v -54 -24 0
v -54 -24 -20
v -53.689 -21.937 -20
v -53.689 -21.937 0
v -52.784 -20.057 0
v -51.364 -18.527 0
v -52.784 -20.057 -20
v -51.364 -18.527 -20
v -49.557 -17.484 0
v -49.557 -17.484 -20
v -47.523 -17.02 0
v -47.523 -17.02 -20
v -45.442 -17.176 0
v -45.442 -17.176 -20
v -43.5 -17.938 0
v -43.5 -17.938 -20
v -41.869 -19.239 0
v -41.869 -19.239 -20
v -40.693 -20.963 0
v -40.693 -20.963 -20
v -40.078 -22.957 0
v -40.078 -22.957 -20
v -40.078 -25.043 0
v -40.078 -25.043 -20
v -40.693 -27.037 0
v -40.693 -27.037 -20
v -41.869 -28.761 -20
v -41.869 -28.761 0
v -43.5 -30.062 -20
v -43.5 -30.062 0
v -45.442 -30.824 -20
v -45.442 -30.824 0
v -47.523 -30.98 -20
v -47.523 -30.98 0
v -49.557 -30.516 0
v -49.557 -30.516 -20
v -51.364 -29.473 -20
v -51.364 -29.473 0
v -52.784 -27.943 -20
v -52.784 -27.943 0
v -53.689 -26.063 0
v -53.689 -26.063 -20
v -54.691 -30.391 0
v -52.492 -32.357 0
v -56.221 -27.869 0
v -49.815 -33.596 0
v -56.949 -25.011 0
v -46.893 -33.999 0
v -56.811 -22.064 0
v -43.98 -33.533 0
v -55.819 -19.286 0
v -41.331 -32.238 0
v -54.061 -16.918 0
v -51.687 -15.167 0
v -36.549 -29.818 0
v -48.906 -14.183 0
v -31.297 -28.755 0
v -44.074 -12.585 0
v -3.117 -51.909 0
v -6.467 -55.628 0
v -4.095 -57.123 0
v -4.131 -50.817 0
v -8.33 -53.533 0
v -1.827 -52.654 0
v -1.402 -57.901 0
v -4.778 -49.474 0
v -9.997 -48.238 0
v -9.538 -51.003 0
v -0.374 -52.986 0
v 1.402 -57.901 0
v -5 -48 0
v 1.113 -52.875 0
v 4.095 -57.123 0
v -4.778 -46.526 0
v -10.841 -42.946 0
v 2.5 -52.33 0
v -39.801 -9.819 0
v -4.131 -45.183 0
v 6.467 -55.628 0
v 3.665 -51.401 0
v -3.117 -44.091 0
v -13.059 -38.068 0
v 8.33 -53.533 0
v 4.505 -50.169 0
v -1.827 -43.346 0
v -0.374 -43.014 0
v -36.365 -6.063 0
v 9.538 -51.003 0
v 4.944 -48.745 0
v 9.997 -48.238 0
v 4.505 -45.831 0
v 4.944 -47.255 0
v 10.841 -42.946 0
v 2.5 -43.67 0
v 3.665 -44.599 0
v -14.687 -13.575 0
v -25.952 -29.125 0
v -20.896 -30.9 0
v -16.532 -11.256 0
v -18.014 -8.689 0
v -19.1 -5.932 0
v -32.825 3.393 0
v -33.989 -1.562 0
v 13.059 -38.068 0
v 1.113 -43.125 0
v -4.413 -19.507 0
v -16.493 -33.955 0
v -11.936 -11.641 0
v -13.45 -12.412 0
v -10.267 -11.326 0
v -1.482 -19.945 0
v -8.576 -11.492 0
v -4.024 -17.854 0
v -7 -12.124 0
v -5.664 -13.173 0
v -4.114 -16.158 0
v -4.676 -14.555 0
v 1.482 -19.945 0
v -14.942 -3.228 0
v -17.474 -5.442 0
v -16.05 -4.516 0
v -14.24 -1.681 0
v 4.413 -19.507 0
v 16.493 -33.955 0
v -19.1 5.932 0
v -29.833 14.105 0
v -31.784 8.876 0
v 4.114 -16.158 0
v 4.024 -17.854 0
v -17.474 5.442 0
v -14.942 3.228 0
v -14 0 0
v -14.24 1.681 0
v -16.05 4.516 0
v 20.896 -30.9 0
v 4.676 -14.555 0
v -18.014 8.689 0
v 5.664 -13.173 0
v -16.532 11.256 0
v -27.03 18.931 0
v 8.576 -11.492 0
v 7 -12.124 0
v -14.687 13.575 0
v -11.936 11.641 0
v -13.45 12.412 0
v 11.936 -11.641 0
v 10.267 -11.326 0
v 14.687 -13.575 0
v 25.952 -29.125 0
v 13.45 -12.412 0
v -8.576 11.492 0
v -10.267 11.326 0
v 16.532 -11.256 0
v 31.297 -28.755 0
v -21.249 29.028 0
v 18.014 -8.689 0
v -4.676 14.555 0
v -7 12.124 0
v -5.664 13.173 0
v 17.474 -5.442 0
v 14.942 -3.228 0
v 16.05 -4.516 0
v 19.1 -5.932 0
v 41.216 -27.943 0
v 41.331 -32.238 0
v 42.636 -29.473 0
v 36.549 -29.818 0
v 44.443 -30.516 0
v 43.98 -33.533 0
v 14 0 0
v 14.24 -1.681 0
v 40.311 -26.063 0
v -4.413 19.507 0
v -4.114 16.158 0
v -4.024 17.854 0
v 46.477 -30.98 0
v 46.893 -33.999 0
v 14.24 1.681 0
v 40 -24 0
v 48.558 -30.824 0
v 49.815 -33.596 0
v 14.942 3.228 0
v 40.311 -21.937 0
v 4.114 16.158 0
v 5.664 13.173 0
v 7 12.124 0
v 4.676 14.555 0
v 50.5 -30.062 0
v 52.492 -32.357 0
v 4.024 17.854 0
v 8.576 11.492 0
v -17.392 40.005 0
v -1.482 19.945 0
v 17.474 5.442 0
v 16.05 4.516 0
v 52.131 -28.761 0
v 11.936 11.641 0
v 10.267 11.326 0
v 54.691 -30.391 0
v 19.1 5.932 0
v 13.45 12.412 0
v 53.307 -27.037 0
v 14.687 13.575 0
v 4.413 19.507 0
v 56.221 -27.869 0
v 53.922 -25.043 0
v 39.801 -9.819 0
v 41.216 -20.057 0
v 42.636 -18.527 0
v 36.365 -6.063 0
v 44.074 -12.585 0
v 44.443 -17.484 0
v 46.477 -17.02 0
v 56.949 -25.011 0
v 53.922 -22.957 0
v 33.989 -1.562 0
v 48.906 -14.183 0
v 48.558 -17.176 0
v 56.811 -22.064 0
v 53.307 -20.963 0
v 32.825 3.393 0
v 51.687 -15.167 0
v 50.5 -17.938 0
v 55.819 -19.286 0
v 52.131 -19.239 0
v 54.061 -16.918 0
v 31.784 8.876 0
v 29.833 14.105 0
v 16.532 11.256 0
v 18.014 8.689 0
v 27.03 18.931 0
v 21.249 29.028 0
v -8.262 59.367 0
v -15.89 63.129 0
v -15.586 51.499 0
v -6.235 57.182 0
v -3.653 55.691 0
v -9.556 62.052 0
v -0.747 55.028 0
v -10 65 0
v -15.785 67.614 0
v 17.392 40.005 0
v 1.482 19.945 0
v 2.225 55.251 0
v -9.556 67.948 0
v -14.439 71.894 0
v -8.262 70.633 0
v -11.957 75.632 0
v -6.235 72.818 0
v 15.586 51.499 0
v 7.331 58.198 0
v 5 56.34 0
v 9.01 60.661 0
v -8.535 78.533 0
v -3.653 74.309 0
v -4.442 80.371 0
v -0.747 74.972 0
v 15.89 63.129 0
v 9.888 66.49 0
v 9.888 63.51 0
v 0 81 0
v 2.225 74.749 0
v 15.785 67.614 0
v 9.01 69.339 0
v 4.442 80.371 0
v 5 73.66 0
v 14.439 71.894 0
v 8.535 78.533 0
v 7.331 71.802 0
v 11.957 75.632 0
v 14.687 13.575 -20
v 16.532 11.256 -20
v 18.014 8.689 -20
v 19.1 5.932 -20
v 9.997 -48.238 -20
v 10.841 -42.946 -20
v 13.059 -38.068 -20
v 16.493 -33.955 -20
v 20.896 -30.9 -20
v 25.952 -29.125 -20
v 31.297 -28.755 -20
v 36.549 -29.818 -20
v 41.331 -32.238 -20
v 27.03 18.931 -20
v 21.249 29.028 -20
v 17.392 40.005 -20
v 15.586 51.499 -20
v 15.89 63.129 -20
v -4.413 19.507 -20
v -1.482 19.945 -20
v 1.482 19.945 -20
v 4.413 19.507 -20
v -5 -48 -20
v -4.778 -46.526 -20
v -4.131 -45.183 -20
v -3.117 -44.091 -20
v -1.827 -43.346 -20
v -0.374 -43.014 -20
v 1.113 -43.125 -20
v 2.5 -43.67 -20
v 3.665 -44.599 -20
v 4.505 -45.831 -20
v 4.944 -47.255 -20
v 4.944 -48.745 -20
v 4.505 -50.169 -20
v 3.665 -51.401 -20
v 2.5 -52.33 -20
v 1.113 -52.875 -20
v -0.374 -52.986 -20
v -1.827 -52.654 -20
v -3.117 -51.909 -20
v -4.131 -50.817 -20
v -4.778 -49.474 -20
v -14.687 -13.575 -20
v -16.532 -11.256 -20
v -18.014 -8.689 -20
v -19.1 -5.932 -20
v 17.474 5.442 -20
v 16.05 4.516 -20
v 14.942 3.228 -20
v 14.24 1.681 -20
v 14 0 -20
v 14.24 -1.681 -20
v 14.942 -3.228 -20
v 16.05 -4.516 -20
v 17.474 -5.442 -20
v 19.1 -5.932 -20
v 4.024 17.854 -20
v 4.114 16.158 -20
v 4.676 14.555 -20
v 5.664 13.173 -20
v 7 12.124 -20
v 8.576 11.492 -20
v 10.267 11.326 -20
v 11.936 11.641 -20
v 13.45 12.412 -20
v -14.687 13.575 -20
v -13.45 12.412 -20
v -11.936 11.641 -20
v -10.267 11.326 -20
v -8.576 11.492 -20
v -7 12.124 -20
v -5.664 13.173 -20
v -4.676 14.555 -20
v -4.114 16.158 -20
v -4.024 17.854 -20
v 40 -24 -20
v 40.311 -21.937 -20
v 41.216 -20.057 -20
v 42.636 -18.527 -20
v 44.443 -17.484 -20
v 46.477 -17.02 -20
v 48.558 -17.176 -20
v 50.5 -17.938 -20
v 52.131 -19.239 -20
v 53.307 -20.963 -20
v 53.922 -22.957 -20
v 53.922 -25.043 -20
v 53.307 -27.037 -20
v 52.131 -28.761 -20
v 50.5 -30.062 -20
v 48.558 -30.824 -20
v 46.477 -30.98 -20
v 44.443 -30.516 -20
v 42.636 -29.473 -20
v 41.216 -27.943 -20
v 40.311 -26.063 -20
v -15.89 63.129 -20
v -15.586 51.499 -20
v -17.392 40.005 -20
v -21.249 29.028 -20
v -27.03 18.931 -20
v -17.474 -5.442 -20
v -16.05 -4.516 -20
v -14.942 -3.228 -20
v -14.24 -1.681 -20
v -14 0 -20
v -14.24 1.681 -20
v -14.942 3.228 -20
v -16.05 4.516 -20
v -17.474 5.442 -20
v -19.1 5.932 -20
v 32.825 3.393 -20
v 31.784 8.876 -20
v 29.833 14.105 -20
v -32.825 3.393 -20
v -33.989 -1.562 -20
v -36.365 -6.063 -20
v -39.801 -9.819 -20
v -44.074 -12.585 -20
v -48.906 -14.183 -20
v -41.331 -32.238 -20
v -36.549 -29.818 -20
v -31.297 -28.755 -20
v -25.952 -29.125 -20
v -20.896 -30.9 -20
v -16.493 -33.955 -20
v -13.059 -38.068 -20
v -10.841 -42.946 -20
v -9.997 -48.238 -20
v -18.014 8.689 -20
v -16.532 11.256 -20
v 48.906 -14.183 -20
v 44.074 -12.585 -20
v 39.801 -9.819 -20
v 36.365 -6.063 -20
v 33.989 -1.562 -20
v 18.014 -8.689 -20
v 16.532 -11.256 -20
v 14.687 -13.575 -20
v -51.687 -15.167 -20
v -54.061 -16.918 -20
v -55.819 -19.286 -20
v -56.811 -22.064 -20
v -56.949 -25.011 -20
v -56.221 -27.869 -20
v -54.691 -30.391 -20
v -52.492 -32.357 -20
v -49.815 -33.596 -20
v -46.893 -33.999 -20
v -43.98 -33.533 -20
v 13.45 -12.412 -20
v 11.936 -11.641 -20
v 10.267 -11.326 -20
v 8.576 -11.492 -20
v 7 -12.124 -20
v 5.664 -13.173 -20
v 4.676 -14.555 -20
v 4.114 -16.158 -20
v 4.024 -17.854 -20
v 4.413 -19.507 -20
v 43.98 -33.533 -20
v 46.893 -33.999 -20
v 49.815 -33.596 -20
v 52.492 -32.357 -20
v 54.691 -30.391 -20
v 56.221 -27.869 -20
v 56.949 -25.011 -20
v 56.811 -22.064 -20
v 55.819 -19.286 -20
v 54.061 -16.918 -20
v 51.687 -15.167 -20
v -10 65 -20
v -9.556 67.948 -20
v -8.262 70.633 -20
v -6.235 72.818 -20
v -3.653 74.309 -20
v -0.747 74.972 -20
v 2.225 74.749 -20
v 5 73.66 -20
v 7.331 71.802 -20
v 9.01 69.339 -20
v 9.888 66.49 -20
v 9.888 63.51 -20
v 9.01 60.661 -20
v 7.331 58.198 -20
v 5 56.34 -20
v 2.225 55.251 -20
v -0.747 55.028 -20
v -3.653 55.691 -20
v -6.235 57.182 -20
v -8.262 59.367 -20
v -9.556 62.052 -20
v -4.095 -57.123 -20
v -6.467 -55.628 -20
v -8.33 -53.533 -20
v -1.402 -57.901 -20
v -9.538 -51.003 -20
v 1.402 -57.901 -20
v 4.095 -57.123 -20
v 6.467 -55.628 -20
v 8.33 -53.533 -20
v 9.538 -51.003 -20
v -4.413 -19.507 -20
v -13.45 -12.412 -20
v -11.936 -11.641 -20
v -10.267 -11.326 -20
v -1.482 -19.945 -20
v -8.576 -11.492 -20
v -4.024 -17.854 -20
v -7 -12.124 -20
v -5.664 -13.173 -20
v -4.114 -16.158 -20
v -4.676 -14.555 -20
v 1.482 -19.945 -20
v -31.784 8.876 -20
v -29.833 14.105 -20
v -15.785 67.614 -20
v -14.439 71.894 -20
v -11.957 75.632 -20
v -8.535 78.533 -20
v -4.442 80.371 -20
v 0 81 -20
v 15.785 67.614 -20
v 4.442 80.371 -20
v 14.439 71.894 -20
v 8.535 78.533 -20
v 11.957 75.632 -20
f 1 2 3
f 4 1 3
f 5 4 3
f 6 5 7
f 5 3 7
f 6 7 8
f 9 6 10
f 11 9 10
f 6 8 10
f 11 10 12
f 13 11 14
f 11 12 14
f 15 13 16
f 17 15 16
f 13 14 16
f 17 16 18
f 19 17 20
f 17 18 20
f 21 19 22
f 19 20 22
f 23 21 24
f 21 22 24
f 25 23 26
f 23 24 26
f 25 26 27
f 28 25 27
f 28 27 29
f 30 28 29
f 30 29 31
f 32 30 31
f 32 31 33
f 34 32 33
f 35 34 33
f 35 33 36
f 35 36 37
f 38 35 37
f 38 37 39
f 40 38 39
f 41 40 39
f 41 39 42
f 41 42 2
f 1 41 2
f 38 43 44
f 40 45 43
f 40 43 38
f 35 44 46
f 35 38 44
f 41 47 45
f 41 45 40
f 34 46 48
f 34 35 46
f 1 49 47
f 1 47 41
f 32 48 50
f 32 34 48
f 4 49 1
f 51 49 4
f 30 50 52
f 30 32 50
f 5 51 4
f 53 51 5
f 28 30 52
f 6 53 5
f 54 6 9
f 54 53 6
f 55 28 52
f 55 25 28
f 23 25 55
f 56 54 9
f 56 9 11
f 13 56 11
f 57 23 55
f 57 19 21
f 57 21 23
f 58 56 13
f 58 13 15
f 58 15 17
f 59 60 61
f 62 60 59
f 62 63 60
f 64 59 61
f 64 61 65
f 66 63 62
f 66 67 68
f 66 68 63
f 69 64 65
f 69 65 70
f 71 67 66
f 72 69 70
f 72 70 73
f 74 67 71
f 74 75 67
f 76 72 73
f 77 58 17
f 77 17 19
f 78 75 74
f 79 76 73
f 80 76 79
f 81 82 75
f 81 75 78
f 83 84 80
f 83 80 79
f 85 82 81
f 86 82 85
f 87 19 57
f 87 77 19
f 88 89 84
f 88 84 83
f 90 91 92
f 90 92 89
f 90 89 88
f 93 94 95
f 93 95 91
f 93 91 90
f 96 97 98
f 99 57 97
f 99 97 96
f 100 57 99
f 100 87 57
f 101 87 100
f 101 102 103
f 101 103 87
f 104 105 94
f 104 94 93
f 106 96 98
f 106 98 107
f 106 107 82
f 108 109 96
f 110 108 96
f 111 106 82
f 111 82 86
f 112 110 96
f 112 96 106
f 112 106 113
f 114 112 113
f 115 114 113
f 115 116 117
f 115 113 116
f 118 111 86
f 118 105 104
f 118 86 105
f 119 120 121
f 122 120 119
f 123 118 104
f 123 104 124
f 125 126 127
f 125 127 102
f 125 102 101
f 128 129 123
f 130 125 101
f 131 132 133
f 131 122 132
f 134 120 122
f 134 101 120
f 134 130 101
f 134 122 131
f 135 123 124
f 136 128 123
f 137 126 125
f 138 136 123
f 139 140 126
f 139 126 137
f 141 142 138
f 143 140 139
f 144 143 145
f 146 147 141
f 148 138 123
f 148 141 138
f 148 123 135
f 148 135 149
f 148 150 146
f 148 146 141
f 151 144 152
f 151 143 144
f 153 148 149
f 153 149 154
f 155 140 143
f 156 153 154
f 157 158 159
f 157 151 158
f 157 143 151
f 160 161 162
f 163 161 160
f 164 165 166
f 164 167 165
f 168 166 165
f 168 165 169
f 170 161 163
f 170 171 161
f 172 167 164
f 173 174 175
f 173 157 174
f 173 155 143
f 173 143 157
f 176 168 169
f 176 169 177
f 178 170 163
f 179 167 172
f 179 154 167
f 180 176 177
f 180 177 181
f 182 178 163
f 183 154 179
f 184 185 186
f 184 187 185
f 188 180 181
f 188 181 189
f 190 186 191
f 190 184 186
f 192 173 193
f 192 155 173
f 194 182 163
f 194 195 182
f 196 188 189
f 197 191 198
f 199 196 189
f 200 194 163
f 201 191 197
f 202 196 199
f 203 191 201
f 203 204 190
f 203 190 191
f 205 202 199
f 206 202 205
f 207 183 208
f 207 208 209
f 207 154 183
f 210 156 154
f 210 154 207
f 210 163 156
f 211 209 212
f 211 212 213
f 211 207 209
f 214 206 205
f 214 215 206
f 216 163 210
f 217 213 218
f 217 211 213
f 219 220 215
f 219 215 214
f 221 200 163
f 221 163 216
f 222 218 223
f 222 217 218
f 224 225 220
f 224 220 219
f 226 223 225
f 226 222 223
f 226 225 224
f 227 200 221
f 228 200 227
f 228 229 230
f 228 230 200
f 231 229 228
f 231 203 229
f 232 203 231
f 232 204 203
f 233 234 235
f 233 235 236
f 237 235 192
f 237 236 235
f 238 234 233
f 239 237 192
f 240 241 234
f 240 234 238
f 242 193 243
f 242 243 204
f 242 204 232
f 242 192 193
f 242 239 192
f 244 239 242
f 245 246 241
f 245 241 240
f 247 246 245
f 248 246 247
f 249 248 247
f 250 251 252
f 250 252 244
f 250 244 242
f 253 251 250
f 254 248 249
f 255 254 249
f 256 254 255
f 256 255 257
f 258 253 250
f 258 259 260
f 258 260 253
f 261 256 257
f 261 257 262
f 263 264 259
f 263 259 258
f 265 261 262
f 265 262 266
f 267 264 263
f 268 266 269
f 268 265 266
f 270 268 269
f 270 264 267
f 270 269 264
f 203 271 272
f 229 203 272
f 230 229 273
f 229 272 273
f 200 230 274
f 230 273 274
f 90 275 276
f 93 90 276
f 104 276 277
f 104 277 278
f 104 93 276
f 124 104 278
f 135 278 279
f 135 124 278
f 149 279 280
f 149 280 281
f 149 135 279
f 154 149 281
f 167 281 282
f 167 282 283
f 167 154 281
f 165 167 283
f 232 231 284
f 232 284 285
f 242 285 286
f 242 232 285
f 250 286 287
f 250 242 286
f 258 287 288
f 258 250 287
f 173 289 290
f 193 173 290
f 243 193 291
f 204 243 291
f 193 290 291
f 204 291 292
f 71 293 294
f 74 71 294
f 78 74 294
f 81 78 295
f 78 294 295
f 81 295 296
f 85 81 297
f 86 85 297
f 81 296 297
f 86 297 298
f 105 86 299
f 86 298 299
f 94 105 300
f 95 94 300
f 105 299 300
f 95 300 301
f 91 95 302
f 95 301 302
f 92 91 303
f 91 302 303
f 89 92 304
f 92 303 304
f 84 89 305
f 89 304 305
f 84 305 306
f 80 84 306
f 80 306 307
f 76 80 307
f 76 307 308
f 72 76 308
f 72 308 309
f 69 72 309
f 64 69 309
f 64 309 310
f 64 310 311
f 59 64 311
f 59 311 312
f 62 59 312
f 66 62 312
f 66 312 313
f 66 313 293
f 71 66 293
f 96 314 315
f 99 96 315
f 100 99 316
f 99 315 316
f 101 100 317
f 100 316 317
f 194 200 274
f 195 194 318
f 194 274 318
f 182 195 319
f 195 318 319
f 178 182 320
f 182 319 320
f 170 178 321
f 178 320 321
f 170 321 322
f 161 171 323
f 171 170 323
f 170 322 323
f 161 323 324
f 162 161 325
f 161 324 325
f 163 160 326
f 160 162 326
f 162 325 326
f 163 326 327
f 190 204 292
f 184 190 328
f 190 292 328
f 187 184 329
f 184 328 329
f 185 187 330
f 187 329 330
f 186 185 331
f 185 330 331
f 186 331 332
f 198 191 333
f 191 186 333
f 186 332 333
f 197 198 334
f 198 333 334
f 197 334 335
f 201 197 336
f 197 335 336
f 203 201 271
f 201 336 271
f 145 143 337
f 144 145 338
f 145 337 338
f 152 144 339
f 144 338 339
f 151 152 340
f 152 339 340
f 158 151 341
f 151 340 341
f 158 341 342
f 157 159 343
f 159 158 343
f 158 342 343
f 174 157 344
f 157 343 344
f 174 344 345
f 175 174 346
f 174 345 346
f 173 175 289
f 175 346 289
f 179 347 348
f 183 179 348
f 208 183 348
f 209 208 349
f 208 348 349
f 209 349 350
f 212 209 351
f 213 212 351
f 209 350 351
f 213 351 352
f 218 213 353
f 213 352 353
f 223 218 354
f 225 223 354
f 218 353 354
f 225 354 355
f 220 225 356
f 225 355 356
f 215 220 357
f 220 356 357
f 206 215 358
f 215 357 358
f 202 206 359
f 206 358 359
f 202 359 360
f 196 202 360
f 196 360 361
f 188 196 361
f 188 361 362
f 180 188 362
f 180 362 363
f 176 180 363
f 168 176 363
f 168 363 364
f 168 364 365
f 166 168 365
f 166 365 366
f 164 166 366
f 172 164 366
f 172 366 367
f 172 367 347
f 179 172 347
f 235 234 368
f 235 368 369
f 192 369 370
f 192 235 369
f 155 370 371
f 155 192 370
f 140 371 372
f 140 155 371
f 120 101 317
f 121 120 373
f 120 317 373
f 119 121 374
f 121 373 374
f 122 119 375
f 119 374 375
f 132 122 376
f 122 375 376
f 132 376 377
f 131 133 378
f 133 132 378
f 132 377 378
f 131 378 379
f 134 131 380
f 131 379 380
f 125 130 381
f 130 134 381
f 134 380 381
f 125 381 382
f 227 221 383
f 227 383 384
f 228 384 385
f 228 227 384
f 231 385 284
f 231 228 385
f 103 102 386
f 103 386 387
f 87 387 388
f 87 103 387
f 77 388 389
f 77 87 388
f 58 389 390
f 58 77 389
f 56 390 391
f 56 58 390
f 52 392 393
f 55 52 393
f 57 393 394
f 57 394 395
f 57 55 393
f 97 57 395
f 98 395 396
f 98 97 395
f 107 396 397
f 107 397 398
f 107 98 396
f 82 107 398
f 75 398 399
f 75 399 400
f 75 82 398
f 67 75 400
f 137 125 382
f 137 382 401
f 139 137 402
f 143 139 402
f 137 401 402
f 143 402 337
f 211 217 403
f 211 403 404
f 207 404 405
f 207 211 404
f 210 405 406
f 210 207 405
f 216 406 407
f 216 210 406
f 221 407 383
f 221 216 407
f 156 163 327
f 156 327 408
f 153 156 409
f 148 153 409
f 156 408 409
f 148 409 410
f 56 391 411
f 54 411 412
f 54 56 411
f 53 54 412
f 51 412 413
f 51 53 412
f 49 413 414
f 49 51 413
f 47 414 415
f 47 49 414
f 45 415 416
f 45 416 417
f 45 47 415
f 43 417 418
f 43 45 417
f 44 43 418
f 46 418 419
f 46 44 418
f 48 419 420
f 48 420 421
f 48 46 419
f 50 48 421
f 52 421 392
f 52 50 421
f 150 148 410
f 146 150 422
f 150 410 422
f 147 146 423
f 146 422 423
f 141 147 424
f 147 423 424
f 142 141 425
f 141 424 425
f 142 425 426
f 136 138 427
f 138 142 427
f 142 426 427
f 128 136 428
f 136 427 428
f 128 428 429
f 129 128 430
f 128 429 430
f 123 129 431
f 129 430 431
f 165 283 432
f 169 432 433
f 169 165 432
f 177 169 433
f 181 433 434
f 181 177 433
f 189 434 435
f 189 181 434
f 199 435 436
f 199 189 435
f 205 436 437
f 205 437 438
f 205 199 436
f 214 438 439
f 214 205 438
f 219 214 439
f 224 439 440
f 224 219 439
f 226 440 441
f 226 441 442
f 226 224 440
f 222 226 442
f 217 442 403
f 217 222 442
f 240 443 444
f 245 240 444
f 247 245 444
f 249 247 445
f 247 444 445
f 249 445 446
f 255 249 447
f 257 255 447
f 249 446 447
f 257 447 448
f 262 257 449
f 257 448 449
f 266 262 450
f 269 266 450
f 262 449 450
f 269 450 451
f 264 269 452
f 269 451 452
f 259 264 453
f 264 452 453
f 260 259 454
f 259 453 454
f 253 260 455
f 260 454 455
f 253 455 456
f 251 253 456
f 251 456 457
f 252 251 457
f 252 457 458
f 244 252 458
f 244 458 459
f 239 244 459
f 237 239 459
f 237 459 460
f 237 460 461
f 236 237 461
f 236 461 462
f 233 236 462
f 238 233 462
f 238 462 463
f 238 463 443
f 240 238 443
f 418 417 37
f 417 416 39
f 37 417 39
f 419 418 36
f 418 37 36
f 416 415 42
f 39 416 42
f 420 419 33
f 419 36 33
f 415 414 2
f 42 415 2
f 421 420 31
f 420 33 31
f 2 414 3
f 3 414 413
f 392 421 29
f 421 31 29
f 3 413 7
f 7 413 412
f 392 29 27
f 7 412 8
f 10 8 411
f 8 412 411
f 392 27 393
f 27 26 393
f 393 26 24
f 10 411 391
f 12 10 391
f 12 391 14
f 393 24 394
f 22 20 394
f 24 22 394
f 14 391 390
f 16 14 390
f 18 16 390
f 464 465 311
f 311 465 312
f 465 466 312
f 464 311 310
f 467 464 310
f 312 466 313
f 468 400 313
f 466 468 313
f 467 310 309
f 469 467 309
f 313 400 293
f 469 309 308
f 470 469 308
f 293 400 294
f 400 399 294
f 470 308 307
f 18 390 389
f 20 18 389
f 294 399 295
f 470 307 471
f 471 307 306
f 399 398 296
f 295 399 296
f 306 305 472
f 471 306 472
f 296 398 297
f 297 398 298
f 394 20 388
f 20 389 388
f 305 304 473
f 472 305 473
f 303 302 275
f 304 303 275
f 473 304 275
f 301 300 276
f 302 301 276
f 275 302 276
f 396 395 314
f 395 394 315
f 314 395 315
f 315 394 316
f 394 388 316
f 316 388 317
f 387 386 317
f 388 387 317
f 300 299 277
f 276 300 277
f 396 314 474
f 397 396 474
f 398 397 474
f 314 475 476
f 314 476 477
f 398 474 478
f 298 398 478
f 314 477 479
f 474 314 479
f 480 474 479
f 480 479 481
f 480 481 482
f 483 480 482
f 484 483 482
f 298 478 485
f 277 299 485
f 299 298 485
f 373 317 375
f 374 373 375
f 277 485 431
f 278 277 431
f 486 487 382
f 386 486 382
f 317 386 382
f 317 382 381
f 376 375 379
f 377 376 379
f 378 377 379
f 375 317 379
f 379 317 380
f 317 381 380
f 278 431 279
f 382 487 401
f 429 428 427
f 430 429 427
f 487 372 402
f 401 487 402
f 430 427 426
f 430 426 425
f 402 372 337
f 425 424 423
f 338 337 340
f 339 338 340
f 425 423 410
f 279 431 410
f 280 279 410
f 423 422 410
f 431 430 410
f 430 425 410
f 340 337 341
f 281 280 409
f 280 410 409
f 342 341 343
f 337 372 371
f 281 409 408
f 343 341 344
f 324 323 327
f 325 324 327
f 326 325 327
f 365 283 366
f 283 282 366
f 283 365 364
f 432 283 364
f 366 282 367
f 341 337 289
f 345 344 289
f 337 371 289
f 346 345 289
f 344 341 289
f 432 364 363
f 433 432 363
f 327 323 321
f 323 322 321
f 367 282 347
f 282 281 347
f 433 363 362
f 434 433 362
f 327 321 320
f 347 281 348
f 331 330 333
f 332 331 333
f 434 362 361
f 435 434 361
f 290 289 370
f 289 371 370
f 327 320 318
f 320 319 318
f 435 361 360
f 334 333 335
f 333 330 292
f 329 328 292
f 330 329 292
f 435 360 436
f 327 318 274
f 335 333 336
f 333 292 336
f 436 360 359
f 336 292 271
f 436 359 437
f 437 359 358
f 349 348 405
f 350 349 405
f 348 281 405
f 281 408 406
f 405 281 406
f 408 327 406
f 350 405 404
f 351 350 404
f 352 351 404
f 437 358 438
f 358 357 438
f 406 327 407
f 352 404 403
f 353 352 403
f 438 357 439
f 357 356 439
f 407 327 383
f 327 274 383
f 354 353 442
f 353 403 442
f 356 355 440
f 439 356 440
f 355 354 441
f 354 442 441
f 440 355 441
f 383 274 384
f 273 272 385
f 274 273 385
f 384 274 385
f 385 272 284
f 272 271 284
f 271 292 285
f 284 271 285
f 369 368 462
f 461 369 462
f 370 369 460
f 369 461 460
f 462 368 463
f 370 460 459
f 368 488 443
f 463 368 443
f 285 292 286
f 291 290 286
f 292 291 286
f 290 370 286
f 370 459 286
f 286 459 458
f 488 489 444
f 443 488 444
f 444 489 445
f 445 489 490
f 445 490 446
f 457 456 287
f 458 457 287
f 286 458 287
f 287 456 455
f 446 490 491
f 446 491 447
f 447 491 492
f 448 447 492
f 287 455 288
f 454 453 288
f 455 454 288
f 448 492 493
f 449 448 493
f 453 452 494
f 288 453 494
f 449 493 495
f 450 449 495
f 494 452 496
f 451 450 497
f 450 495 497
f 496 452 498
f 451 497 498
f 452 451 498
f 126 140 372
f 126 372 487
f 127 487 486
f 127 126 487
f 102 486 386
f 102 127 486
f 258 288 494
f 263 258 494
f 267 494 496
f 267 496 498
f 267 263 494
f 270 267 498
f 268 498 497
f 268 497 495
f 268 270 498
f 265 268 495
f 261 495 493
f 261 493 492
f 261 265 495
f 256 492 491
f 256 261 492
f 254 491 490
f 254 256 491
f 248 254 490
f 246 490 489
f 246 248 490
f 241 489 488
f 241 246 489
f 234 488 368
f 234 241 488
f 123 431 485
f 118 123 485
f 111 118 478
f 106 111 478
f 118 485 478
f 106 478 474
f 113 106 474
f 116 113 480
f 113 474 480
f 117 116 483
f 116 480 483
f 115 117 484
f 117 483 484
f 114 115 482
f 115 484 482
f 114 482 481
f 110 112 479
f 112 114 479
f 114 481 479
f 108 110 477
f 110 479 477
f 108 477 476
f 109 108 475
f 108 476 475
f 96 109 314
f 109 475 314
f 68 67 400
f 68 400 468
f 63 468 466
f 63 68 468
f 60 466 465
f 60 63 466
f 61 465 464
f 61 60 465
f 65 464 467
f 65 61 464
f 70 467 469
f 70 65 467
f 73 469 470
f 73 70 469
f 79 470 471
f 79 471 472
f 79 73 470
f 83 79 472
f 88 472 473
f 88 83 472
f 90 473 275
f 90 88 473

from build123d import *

# Parameters (mm, degrees)
BOSS_EXTRUDE1_DEPTH = 20
SKETCH3_R           = 10
SKETCH3_R_2         = 7
SKETCH3_R_3         = 5
CUT_EXTRUDE1_DEPTH  = 102.044544633


with BuildPart() as part:
    # Sketch2 → Boss-Extrude1 (new body)
    with BuildSketch(Plane.XY):
        with BuildLine():
            ThreePointArc((32.82507564, 3.393288852), (30.919385889, 11.532197372), (27.029816197, 18.931165741))
            ThreePointArc((27.029816197, 18.931165741), (17.392020832, 40.004906757), (15.890255583, 63.129230769))
            ThreePointArc((15.890255583, 63.129230769), (0, 81), (-15.890255583, 63.129230769))
            ThreePointArc((-15.890255583, 63.129230769), (-17.392020832, 40.004906757), (-27.029816197, 18.931165741))
            ThreePointArc((-27.029816197, 18.931165741), (-30.919385889, 11.532197372), (-32.82507564, 3.393288852))
            ThreePointArc((-32.82507564, 3.393288852), (-37.963155814, -8.050663767), (-48.906353625, -14.183390817))
            ThreePointArc((-48.906353625, -14.183390817), (-56.22107819, -27.869330305), (-41.330511904, -32.237530257))
            ThreePointArc((-41.330511904, -32.237530257), (-20.895992582, -30.900485472), (-9.997178571, -48.237530257))
            ThreePointArc((-9.997178571, -48.237530257), (0, -58), (9.997178571, -48.237530257))
            ThreePointArc((9.997178571, -48.237530257), (20.895992582, -30.900485472), (41.330511904, -32.237530257))
            ThreePointArc((41.330511904, -32.237530257), (56.22107819, -27.869330305), (48.906353625, -14.183390817))
            ThreePointArc((48.906353625, -14.183390817), (37.963155814, -8.050663767), (32.82507564, 3.393288852))
        make_face()
    extrude(amount=-BOSS_EXTRUDE1_DEPTH)

    # Sketch3 → Cut-Extrude1 (cut, through all)
    with BuildSketch(Plane(origin=(0, 0, -20), x_dir=(-1, 0, 0), z_dir=(0, 0, -1))):
        with Locations((0, 65)):
            Circle(SKETCH3_R)
        with Locations((47, -24)):
            Circle(SKETCH3_R_2)
        with Locations((0, -48)):
            Circle(SKETCH3_R_3)
        with Locations((-47, -24)):
            Circle(SKETCH3_R_2)
        with BuildLine():
            ThreePointArc((-14.687363137, 13.575027222), (-17.320508076, 10), (-19.1, 5.93211598))
            ThreePointArc((-19.1, 5.93211598), (-14, 0), (-19.1, -5.93211598))
            ThreePointArc((-19.1, -5.93211598), (-17.320508076, -10), (-14.687363137, -13.575027222))
            ThreePointArc((-14.687363137, -13.575027222), (-7, -12.124355653), (-4.412636863, -19.507143202))
            ThreePointArc((-4.412636863, -19.507143202), (0, -20), (4.412636863, -19.507143202))
            ThreePointArc((4.412636863, -19.507143202), (7, -12.124355653), (14.687363137, -13.575027222))
            ThreePointArc((14.687363137, -13.575027222), (17.320508076, -10), (19.1, -5.93211598))
            ThreePointArc((19.1, -5.93211598), (14, 0), (19.1, 5.93211598))
            ThreePointArc((19.1, 5.93211598), (17.320508076, 10), (14.687363137, 13.575027222))
            ThreePointArc((14.687363137, 13.575027222), (7, 12.124355653), (4.412636863, 19.507143202))
            ThreePointArc((4.412636863, 19.507143202), (0, 20), (-4.412636863, 19.507143202))
            ThreePointArc((-4.412636863, 19.507143202), (-7, 12.124355653), (-14.687363137, 13.575027222))
        make_face()
    extrude(amount=-CUT_EXTRUDE1_DEPTH, mode=Mode.SUBTRACT)


solid = part.part
